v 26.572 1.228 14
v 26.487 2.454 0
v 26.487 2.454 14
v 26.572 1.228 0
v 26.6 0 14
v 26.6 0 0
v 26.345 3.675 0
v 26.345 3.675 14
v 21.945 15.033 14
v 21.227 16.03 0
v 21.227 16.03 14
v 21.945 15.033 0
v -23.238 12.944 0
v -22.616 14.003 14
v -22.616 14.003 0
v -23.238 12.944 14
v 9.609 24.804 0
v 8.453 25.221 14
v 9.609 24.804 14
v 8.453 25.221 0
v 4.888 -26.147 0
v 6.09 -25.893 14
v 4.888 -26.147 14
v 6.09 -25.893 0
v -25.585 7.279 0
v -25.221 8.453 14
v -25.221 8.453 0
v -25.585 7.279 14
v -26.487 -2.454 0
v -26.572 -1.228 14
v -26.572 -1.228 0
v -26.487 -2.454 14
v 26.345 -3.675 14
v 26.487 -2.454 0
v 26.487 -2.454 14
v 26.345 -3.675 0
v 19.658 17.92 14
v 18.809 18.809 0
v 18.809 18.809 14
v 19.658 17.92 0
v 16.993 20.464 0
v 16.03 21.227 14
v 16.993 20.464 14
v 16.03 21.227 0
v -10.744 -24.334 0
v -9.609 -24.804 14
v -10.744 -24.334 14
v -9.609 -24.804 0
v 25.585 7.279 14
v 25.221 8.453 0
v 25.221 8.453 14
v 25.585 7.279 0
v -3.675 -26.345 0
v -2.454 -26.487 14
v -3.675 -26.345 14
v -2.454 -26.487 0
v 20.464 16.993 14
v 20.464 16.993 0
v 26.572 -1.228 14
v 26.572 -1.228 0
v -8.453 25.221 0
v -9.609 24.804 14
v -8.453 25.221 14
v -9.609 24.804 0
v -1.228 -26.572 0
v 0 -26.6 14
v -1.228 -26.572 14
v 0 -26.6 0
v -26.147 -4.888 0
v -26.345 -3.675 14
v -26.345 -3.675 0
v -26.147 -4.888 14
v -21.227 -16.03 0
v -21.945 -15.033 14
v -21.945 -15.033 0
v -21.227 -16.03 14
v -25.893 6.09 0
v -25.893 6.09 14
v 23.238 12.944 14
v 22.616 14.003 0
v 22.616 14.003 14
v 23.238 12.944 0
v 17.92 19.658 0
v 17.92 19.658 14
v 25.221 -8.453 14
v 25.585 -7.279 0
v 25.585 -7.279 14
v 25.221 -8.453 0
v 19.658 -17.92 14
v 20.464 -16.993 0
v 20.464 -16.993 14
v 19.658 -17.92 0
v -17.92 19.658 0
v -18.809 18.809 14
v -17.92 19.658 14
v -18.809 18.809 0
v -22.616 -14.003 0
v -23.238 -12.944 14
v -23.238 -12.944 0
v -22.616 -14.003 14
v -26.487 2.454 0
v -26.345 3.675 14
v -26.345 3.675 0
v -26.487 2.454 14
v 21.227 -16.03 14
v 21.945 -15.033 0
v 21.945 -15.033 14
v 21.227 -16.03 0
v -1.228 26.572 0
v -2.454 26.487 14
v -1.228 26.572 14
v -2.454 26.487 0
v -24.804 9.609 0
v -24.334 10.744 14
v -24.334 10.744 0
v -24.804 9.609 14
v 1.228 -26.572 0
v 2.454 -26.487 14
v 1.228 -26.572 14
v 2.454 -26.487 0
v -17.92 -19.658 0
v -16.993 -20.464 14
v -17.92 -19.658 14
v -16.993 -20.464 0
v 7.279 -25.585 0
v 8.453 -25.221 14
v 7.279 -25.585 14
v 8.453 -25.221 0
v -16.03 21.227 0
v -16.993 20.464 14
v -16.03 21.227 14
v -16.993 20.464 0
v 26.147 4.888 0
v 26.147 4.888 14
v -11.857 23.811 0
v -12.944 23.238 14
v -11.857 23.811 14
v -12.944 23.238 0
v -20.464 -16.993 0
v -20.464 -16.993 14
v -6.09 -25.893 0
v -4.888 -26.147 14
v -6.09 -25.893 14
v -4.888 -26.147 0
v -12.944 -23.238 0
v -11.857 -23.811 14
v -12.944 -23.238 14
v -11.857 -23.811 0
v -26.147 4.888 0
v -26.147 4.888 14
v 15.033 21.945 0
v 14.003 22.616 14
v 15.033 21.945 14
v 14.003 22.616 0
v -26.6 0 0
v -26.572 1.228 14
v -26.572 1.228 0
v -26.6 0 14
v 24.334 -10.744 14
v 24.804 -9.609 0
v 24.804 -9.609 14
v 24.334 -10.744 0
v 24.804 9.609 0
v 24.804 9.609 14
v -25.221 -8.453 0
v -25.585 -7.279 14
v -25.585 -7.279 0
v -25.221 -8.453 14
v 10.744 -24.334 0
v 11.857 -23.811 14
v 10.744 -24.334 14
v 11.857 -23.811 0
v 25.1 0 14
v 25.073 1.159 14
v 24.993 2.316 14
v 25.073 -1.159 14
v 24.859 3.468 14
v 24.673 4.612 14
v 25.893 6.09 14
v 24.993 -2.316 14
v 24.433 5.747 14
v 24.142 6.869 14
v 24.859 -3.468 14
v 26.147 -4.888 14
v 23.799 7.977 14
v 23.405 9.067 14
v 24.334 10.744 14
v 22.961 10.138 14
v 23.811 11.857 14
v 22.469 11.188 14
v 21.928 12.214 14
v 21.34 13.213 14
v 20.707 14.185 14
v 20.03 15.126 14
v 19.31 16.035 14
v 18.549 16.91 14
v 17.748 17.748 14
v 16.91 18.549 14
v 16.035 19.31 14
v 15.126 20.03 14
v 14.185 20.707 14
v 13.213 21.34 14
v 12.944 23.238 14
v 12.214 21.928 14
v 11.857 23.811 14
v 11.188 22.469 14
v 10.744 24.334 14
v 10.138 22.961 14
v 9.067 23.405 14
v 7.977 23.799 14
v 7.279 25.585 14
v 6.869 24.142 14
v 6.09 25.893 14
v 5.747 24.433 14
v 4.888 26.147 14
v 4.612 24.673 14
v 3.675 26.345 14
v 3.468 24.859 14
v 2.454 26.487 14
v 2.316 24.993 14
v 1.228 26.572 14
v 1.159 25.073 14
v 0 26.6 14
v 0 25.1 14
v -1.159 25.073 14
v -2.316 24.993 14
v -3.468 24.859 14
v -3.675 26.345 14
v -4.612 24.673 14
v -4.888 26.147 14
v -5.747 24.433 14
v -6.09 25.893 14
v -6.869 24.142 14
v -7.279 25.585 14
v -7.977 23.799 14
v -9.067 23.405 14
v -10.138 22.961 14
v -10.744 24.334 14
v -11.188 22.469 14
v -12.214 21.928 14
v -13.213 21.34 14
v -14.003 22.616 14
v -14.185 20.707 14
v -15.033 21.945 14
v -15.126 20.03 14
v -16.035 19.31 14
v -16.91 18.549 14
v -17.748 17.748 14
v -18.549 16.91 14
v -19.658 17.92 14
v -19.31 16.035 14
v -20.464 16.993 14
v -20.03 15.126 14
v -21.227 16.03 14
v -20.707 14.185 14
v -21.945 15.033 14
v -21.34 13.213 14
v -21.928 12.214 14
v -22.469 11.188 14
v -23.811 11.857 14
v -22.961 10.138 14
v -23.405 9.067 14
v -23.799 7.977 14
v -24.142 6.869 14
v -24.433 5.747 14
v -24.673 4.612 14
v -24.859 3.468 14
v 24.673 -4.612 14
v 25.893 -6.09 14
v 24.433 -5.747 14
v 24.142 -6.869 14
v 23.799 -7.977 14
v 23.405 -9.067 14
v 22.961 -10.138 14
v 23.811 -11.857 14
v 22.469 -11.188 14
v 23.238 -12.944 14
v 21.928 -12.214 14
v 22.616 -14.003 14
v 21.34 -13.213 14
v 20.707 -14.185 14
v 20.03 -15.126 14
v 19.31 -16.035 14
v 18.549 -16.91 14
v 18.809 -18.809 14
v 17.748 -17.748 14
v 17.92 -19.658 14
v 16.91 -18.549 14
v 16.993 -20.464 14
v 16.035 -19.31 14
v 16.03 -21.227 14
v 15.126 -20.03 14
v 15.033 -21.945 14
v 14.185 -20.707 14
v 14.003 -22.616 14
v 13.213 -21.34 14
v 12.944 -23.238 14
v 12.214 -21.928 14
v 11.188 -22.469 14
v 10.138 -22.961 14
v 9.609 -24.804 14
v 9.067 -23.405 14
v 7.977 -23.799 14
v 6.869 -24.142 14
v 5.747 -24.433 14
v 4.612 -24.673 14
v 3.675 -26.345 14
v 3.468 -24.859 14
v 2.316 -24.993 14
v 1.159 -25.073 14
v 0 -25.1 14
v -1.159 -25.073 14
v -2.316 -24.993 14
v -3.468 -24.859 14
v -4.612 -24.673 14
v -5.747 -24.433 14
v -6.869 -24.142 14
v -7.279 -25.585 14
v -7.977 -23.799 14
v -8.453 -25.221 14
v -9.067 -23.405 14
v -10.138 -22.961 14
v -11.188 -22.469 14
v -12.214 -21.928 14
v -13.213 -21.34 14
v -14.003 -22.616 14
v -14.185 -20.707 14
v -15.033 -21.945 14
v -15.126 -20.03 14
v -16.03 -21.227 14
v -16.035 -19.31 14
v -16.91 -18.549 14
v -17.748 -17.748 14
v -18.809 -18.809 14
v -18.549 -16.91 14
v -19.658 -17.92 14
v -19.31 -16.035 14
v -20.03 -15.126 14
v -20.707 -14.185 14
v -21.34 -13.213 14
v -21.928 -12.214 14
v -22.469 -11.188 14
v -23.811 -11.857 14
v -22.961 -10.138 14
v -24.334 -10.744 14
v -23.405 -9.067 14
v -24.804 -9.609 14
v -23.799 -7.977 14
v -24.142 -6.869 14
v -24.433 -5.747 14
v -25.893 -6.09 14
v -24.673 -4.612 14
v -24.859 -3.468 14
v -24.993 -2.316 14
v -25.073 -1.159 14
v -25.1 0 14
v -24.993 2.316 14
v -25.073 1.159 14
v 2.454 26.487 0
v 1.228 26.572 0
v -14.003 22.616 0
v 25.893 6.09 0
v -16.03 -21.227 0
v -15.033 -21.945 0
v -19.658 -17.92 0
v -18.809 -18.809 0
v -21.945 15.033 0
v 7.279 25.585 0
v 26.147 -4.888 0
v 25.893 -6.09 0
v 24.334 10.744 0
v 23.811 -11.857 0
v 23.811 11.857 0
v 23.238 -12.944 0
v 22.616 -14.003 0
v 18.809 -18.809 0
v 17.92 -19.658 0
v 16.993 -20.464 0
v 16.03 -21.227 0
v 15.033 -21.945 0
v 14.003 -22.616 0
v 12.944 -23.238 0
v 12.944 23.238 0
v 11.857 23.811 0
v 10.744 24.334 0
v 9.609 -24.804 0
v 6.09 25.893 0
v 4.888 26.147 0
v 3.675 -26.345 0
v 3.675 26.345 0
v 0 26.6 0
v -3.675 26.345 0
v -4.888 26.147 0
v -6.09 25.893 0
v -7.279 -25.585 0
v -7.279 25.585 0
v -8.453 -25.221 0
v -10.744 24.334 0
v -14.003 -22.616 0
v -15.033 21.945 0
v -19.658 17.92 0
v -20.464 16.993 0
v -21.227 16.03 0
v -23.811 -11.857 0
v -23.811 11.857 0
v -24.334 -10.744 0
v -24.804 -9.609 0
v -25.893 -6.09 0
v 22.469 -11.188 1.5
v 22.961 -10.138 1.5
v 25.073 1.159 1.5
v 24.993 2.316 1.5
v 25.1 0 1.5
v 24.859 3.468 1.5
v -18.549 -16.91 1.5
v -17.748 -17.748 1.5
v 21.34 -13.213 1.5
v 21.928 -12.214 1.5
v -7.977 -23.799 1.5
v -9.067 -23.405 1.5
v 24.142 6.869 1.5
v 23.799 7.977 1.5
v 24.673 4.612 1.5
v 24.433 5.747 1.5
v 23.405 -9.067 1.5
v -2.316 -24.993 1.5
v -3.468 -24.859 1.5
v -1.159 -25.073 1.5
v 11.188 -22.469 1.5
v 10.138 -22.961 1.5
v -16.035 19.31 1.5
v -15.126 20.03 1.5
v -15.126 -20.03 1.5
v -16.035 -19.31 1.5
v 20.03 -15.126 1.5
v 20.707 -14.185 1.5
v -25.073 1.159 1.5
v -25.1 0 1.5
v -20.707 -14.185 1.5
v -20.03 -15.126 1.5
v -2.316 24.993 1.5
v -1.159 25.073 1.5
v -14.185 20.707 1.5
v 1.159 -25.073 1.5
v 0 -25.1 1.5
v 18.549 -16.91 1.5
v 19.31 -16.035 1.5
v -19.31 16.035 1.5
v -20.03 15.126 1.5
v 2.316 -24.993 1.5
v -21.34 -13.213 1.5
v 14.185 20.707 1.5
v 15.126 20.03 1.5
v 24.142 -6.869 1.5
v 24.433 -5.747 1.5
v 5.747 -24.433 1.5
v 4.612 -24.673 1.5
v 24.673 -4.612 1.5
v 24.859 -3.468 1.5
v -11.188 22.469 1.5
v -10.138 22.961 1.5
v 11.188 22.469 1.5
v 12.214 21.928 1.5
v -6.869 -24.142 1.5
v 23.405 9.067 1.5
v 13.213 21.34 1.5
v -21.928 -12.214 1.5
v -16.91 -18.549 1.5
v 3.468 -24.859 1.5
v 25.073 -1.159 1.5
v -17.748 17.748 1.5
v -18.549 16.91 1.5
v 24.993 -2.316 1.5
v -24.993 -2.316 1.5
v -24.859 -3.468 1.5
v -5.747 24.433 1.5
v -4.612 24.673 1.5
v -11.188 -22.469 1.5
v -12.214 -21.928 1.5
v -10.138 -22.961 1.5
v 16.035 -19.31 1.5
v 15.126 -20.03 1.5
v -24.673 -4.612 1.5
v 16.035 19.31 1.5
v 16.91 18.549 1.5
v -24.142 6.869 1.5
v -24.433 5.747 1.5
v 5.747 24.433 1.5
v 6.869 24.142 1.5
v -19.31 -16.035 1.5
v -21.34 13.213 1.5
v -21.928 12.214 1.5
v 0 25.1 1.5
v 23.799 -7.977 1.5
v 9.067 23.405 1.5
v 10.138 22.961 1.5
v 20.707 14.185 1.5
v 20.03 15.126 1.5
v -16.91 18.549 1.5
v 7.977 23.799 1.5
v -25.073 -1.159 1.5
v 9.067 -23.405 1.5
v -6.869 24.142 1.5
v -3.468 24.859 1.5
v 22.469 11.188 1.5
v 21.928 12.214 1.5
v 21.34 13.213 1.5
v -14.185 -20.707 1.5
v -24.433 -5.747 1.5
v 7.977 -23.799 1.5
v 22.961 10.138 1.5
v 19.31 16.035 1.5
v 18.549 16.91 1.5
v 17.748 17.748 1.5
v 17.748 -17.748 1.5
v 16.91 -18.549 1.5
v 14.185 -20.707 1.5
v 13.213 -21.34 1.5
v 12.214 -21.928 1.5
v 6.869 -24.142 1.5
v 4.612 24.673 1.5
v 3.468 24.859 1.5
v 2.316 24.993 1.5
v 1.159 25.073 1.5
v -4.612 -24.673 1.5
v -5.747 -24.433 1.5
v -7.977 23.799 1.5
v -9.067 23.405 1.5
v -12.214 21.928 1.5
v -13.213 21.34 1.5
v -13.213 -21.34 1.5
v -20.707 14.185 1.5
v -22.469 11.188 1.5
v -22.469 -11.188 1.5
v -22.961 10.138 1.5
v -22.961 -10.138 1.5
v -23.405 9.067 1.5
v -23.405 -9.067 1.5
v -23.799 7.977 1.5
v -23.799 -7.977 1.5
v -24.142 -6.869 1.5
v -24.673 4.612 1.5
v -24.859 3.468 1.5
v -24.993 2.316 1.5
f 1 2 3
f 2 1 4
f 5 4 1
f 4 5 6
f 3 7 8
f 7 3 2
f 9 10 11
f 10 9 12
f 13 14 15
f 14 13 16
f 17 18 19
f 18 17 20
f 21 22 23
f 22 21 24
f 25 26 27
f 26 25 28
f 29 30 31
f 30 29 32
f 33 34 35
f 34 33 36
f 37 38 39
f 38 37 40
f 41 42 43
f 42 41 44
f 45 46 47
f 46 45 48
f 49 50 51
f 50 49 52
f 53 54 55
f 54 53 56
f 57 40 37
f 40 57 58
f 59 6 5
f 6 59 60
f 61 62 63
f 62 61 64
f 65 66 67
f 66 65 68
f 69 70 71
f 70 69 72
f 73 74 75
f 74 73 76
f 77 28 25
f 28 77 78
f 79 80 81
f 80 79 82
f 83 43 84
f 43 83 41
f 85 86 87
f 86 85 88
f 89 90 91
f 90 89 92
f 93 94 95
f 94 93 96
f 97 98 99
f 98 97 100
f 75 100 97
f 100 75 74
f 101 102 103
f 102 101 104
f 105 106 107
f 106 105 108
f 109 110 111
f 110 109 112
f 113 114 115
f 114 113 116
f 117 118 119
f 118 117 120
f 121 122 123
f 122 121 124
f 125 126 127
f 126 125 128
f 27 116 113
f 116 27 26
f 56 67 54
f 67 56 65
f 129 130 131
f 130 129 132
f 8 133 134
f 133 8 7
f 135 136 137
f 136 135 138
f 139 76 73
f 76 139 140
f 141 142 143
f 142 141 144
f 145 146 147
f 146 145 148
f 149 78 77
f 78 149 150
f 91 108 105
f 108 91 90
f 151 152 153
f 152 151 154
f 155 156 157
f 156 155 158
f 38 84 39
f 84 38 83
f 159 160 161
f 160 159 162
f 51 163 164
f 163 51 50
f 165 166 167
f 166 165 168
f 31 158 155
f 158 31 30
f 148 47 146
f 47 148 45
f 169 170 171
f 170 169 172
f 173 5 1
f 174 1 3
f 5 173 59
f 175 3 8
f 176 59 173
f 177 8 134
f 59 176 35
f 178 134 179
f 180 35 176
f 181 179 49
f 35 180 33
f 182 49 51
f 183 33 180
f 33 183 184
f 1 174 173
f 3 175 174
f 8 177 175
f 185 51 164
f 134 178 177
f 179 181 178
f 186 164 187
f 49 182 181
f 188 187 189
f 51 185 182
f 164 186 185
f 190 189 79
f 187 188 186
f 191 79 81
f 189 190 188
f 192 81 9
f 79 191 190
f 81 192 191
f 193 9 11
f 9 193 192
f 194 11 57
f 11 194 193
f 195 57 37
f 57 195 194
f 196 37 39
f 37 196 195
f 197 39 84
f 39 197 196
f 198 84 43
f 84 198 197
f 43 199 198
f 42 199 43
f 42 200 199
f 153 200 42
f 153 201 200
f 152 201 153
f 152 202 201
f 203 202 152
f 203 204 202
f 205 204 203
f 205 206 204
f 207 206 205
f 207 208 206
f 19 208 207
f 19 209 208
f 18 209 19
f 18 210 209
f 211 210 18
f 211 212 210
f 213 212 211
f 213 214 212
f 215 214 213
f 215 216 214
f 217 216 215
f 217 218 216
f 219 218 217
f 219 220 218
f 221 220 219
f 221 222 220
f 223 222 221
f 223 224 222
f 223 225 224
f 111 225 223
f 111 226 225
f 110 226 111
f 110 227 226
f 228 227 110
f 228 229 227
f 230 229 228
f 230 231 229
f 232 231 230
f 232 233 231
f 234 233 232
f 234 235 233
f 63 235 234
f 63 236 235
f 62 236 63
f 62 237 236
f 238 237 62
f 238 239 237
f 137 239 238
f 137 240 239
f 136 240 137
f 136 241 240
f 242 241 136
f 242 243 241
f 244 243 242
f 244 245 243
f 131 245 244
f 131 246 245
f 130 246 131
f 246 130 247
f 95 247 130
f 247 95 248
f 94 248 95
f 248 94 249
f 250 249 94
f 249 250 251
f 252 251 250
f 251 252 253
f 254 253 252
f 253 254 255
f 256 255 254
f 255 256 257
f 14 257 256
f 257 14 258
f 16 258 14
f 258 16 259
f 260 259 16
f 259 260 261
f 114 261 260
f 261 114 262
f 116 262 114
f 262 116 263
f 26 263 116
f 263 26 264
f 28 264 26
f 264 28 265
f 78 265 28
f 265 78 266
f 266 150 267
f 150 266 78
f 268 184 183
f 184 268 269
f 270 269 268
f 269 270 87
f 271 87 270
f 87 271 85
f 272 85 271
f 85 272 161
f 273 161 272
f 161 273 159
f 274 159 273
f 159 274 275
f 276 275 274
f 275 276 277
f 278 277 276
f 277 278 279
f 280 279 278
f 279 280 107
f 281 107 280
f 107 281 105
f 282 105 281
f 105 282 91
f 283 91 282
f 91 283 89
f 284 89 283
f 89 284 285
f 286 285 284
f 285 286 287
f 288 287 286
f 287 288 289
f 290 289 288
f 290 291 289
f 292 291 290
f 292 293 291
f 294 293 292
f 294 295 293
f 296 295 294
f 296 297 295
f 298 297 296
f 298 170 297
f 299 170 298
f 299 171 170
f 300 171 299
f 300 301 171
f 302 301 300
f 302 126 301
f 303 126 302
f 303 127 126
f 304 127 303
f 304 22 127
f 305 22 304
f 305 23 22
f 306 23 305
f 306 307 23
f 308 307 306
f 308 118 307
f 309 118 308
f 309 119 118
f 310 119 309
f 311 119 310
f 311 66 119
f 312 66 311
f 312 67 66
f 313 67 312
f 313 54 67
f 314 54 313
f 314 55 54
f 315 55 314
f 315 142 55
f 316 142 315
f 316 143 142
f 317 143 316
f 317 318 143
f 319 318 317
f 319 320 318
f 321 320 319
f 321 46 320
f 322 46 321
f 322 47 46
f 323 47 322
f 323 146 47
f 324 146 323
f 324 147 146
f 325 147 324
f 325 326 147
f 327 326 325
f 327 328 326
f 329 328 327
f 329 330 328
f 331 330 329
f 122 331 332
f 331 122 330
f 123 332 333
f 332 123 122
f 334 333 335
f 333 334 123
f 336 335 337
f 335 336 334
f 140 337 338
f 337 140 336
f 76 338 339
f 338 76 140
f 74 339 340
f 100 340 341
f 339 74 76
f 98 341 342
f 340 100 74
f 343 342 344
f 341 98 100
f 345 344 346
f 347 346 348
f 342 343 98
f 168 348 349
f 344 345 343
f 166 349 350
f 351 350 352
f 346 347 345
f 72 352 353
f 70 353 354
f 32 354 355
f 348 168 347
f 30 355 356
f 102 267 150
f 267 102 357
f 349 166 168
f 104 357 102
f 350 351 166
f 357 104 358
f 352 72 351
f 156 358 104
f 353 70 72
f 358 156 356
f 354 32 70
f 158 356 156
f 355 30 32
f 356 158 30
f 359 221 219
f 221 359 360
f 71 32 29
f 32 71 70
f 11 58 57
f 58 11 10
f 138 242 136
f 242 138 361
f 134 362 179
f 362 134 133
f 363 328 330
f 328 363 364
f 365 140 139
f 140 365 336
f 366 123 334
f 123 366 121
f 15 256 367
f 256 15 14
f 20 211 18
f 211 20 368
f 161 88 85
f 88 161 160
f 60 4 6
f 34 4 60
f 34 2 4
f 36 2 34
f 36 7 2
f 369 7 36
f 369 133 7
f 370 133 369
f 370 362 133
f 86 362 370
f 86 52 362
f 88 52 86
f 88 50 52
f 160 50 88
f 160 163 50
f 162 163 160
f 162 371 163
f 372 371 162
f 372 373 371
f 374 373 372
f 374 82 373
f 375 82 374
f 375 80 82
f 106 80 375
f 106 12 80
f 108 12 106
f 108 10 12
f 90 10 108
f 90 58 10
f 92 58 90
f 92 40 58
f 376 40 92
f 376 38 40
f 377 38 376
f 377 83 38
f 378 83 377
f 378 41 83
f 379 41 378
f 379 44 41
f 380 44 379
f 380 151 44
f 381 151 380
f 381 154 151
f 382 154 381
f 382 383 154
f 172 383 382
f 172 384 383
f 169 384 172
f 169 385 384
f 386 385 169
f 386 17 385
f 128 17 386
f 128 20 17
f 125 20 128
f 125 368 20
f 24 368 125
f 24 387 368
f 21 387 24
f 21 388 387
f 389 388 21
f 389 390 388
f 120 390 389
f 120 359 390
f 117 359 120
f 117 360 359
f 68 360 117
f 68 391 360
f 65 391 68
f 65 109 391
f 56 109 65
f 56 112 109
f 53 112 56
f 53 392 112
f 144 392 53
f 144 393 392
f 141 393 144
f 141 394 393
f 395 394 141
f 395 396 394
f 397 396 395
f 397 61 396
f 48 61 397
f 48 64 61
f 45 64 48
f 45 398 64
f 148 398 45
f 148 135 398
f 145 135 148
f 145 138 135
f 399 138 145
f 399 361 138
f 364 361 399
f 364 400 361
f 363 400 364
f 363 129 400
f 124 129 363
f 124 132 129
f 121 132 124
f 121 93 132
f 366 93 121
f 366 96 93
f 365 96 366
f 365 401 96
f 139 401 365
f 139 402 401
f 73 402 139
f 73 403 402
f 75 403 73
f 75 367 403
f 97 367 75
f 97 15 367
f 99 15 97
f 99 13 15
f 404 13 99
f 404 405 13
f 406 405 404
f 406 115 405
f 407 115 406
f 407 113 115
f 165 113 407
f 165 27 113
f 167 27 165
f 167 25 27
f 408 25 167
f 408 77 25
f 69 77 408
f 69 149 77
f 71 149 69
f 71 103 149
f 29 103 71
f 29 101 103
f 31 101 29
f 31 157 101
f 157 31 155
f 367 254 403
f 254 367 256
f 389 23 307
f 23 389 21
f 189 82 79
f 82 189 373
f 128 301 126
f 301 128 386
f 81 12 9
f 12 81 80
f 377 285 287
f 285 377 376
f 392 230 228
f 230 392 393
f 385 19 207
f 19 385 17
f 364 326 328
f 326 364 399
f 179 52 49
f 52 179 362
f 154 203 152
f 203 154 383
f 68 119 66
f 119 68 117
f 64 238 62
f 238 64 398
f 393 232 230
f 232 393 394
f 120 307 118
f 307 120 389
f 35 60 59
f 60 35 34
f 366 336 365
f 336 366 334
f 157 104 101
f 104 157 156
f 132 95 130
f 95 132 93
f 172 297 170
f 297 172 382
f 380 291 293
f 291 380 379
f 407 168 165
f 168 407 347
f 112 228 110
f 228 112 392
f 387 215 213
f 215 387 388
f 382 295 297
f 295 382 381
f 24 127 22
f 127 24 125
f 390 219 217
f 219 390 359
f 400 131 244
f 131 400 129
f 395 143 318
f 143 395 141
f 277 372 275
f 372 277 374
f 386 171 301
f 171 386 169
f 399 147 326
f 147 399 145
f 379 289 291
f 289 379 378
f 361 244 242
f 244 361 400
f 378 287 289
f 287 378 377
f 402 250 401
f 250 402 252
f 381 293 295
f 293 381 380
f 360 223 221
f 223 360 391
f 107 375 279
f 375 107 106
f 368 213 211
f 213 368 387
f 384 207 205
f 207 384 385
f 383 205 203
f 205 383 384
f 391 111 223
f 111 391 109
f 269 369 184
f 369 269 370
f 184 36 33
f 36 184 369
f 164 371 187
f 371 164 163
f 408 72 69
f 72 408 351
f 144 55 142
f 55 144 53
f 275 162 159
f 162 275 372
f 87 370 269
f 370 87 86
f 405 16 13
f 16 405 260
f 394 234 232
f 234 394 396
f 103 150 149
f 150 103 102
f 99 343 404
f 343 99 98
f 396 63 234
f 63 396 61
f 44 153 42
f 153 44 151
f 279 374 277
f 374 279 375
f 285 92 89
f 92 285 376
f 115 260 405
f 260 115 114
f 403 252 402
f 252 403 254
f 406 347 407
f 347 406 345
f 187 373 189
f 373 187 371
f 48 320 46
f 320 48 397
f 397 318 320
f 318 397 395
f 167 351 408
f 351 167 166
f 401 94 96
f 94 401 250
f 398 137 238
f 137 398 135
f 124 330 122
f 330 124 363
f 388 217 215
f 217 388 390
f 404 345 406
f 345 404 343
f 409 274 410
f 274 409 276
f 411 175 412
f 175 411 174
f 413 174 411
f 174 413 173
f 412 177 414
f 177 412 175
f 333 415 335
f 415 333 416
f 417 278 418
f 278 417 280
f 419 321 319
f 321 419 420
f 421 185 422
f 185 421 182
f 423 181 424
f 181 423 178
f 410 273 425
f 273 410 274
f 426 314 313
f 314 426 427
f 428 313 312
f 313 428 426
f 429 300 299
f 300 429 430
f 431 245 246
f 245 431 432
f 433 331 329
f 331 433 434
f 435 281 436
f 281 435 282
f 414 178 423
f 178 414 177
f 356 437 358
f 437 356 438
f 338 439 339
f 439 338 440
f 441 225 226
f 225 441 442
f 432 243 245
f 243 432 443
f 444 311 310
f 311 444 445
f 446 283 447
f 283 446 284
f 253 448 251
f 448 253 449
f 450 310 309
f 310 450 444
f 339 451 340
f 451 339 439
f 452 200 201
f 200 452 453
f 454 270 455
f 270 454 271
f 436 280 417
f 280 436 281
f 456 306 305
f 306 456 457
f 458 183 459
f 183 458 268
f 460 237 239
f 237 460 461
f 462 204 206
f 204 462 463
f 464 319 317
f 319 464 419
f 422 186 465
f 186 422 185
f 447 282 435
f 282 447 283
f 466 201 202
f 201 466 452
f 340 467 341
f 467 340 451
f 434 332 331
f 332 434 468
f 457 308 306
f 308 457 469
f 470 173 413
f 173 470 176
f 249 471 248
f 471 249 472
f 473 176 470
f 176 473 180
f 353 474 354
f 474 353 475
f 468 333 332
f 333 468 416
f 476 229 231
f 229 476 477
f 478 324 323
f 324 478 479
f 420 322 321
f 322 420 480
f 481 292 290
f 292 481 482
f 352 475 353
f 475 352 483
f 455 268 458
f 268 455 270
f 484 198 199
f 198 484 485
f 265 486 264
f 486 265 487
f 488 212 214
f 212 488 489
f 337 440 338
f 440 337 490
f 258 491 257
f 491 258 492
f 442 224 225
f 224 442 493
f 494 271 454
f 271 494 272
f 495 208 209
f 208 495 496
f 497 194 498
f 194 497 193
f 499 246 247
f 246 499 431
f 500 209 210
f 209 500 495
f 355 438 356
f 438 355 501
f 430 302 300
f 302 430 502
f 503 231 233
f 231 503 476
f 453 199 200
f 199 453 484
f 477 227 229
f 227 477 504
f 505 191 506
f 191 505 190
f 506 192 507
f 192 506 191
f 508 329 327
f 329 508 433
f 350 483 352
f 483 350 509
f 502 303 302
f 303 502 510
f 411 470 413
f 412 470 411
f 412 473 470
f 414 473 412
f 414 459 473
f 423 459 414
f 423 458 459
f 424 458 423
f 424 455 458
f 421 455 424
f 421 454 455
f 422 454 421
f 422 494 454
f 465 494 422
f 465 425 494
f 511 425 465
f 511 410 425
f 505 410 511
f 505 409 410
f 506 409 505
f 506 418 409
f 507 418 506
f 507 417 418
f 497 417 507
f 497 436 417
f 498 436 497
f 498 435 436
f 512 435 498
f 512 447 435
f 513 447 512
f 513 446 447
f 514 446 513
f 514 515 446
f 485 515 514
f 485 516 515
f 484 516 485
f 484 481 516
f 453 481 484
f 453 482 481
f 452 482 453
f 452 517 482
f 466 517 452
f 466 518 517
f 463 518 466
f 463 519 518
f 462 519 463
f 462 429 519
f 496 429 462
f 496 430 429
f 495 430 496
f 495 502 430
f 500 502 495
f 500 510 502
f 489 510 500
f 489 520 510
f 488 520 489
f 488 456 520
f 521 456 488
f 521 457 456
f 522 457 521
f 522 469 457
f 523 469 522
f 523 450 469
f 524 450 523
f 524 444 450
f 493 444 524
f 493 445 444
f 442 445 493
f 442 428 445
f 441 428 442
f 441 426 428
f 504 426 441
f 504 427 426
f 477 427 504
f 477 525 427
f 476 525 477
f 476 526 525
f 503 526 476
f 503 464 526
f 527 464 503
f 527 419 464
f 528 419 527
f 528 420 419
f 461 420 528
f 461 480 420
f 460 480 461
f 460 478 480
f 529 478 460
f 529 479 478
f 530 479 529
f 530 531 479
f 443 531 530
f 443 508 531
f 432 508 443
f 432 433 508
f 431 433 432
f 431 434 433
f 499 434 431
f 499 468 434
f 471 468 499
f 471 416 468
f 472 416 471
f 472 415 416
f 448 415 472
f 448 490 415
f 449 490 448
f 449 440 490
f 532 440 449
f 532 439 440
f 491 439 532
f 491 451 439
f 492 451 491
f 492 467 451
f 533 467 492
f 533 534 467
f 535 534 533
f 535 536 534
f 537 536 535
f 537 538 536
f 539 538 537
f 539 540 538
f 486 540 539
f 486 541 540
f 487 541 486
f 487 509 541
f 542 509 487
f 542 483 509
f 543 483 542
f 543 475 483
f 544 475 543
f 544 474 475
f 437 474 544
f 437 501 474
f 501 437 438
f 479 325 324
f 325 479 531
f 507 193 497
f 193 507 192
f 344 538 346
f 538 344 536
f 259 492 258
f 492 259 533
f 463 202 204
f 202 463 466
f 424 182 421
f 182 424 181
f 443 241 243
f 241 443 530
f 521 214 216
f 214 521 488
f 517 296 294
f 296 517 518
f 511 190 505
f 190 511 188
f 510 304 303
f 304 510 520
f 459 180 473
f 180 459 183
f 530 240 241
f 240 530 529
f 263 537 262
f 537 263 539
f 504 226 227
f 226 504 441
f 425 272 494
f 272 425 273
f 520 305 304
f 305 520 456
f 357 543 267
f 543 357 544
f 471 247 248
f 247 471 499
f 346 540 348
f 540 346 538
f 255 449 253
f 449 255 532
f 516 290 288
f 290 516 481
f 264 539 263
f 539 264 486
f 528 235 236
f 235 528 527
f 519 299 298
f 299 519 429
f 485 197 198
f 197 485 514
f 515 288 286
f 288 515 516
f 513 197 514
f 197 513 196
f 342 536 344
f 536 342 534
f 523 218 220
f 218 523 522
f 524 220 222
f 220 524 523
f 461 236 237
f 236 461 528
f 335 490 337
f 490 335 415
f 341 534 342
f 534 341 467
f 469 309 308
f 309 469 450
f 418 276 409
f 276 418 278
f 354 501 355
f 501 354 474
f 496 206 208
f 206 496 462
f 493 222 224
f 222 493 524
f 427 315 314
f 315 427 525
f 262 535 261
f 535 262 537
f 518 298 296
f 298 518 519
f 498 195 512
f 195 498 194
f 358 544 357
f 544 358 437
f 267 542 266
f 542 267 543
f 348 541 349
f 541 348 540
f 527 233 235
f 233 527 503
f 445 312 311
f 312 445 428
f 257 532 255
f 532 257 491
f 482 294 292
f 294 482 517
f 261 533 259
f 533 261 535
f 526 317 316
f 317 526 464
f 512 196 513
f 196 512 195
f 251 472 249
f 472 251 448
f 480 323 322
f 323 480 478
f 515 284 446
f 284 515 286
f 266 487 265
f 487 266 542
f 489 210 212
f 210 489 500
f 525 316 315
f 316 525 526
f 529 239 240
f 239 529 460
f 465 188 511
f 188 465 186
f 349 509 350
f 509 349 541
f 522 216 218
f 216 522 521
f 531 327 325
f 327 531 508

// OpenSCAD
od = 53.2;
h = 14;
wall = 1.5;

$fn = 136;

difference() {
    cylinder(d=od,h=h);
    translate([0,0,wall]) cylinder(d=od-2*wall,h=h);
}
